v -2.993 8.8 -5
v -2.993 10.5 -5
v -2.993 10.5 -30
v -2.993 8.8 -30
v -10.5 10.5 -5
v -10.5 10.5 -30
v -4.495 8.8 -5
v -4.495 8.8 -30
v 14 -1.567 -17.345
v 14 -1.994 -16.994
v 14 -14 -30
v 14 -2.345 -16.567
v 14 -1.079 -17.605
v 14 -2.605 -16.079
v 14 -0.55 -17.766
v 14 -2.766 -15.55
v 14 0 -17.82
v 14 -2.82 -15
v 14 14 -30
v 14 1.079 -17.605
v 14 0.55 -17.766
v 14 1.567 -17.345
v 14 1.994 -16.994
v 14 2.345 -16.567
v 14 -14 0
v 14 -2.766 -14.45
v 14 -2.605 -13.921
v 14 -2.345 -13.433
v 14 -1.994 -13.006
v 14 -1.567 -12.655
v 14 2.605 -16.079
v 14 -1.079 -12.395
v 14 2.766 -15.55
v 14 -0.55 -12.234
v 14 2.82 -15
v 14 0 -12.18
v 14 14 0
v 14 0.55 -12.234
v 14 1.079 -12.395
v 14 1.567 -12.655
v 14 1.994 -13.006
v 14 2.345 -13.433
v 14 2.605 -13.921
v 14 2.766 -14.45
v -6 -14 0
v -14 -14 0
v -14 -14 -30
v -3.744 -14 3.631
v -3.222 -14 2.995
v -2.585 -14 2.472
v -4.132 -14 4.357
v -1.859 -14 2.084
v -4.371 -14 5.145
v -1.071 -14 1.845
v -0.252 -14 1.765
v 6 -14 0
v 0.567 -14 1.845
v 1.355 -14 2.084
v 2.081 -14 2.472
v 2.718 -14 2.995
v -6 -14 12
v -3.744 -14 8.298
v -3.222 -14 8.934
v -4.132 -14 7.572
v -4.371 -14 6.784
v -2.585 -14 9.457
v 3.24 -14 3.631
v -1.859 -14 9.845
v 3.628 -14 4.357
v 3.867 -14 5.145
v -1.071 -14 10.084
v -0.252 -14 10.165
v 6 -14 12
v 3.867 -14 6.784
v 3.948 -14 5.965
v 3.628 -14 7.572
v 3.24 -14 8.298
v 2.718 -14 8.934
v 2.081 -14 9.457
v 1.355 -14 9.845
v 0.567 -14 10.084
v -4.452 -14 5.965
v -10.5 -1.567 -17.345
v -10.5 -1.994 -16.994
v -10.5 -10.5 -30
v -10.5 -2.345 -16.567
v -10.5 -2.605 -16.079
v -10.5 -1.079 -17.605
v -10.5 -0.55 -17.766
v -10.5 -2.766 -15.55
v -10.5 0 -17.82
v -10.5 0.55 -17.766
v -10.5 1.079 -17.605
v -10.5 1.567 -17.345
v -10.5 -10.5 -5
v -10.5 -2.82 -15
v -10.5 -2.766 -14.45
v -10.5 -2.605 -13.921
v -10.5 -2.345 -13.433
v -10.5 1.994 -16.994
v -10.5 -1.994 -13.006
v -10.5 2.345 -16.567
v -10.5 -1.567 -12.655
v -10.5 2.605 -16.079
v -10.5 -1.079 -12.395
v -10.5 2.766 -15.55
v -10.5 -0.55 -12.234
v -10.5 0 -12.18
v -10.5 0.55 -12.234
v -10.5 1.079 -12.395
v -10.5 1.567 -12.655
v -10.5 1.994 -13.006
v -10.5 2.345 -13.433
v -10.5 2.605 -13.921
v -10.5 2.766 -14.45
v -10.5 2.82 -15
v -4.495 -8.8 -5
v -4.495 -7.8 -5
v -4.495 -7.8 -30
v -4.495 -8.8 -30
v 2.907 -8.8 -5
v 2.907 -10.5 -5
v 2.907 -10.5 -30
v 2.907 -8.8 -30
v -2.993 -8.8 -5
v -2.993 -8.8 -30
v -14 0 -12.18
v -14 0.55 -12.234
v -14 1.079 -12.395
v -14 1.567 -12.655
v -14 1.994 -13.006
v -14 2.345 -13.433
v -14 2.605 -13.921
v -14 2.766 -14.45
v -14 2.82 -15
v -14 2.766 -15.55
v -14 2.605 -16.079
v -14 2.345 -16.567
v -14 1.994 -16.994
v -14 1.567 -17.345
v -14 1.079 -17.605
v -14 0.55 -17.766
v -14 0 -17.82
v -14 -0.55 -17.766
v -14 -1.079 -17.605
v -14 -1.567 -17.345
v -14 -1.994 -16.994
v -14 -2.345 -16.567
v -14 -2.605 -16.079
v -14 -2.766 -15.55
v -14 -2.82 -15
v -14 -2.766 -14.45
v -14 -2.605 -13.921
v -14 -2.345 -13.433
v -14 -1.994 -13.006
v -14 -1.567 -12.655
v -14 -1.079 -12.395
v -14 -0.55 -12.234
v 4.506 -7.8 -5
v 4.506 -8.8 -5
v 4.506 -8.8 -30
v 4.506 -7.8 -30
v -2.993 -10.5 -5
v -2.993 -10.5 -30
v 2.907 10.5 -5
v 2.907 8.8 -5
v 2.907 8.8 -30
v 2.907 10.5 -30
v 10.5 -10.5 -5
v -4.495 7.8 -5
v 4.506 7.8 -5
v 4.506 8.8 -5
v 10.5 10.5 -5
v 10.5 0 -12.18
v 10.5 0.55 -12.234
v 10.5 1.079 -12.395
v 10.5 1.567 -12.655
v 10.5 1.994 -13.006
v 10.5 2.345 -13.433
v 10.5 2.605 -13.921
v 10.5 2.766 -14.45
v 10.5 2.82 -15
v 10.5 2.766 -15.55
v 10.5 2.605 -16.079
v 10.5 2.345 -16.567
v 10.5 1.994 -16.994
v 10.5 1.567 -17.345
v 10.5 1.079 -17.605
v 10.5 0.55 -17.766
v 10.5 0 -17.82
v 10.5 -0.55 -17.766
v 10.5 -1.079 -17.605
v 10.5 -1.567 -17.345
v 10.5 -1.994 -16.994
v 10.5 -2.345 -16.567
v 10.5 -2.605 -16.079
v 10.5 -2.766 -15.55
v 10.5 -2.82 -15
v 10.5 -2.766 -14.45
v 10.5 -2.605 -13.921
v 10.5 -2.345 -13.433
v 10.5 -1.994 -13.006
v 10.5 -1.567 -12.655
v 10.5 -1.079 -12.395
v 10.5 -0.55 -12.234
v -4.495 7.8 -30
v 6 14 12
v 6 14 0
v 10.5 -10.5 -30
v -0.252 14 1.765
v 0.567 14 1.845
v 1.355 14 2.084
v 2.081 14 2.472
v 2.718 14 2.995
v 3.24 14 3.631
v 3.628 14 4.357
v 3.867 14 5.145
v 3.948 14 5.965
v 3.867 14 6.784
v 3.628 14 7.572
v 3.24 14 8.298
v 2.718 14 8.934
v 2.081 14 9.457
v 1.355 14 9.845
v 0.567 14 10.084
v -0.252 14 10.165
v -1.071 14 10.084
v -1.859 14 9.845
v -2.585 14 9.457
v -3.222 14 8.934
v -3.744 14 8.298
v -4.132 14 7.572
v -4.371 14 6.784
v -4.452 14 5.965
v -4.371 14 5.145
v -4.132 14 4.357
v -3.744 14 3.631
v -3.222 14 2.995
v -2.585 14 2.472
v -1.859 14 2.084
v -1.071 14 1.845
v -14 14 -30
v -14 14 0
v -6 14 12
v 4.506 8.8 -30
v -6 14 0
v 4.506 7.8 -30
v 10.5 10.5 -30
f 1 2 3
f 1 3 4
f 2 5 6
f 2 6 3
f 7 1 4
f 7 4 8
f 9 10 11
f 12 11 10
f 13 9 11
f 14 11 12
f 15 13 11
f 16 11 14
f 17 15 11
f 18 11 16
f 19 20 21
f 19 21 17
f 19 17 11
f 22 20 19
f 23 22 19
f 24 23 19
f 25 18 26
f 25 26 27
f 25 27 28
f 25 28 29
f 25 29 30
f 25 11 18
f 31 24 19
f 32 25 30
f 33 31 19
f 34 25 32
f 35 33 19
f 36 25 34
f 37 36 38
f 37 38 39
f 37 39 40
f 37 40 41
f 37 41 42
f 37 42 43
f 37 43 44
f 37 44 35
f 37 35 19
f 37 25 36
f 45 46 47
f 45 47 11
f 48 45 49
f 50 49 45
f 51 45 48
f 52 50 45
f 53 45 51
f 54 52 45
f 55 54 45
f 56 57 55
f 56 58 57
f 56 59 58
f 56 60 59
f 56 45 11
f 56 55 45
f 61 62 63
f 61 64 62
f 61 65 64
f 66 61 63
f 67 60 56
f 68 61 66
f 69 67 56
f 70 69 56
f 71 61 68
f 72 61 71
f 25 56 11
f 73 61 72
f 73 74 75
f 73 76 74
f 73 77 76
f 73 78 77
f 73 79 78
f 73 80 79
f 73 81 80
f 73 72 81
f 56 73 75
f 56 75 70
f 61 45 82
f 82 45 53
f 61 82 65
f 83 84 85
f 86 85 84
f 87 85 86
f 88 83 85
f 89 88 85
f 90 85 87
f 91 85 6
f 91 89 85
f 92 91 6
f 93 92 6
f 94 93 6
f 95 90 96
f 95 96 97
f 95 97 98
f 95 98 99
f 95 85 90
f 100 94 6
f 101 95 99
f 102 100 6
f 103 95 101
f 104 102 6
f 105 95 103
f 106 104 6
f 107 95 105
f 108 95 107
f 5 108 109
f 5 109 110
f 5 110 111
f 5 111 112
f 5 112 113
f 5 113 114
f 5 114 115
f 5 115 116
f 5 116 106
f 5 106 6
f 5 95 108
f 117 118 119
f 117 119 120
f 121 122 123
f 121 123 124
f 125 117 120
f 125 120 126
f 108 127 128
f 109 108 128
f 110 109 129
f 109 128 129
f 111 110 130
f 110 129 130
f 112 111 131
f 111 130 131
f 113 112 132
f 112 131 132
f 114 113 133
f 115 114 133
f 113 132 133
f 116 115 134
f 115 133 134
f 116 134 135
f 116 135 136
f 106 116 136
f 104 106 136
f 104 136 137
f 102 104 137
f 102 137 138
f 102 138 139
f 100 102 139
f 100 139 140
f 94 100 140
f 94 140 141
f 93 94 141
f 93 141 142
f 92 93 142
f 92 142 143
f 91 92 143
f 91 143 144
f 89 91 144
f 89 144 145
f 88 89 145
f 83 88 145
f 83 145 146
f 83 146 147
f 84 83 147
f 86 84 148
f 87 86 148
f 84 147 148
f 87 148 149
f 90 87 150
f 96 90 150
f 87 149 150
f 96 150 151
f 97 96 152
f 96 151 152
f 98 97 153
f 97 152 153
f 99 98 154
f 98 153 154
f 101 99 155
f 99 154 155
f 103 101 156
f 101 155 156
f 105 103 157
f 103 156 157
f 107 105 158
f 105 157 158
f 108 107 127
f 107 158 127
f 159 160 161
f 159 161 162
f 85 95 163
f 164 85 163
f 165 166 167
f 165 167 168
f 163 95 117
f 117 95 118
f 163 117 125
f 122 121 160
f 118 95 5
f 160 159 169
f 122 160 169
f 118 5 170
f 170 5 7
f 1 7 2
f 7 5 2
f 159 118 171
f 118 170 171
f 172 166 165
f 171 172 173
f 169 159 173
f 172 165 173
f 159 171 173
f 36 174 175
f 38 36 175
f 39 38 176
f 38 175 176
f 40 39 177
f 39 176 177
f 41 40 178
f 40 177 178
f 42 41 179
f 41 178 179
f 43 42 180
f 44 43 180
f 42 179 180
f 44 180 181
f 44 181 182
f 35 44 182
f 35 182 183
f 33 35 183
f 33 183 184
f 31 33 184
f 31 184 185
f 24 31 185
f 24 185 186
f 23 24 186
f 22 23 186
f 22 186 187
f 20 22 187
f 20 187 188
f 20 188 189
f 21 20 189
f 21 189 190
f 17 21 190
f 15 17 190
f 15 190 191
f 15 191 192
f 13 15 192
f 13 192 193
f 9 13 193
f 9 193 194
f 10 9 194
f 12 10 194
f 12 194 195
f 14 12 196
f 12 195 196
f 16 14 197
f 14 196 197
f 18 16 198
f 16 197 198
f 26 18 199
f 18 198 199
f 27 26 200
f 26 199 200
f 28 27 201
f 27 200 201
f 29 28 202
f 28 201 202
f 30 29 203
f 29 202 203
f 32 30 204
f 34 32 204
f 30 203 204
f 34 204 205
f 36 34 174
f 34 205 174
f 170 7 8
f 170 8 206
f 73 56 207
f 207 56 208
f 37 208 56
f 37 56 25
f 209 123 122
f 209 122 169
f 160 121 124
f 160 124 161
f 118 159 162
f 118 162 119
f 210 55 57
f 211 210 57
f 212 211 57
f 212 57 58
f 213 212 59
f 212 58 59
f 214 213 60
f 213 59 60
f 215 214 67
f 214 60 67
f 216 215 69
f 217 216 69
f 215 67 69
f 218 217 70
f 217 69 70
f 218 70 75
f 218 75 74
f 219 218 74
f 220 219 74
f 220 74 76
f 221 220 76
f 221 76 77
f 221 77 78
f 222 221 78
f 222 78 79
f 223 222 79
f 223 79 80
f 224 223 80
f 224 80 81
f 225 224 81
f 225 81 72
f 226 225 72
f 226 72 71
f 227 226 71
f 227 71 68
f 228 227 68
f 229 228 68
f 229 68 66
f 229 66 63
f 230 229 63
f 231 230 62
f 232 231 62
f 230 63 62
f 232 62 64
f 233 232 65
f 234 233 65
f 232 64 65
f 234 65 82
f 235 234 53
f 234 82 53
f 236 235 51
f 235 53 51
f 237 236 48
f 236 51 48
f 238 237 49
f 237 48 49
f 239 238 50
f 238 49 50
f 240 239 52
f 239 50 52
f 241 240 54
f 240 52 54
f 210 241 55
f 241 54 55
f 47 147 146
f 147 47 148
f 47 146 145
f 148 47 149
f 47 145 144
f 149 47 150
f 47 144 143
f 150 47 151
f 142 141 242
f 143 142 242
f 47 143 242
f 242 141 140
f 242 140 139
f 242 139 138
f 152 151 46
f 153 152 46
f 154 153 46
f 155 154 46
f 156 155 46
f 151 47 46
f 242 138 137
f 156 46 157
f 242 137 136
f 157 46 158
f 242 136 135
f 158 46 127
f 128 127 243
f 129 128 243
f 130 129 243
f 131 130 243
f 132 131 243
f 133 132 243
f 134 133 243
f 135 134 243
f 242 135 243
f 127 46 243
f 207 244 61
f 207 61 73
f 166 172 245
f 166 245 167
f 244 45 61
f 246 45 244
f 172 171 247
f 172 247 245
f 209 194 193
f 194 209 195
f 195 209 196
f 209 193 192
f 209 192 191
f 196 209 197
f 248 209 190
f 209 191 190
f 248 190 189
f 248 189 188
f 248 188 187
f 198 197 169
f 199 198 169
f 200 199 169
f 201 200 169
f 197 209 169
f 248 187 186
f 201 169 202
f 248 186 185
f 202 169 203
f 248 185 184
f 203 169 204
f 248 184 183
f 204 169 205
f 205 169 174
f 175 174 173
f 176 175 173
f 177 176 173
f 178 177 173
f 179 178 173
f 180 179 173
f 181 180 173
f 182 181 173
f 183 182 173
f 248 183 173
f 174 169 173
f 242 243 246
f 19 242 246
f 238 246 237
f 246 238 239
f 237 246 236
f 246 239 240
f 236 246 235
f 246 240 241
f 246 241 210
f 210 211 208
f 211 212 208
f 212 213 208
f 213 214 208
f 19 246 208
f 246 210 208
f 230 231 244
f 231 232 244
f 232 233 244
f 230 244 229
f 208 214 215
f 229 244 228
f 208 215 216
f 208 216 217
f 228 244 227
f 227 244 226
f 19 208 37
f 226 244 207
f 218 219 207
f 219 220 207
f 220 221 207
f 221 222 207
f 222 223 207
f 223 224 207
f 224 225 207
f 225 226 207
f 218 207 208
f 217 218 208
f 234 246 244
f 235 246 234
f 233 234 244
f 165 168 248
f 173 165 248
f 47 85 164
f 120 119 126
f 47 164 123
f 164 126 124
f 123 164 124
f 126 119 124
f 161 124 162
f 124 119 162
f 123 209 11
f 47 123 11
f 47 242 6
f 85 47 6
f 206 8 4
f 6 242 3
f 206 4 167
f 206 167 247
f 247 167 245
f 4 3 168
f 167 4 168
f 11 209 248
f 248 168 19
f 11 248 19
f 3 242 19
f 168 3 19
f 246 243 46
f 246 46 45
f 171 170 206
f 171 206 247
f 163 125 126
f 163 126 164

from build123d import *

# Parameters (mm, degrees)
EXTRUDE_2_DEPTH     = 30
EXTRUDE_2_2_DEPTH   = 30
EXTRUDE_3_DEPTH     = 5
SKETCH_2_5_W        = 28
SKETCH_2_5_H        = 28
EXTRUDE_4_DEPTH     = 30
SKETCH_5_R          = 2.82
CUT_EXTRUDE_1_DEPTH = 44.358966777
SKETCH_6_W          = 12
SKETCH_6_H          = 28
EXTRUDE_7_DEPTH     = 12
SKETCH_9_R          = 4.2
CUT_EXTRUDE_3_DEPTH = 44.358966777


with BuildPart() as part:
    # Эскиз2 → Бобышка-Вытянуть2 (new body)
    with BuildSketch(Plane.XY):
        Polygon((2.906720935, 8.8), (2.906720935, 10.5), (-2.993279065, 10.5), (-2.993279065, 8.8), (-4.495247842, 8.8), (-4.495247842, 7.799871607), (4.505554414, 7.799871607), (4.505554414, 8.8), align=None)
    extrude(amount=-EXTRUDE_2_DEPTH)



with BuildPart() as body_2:
    # Эскиз2 → Extrude 2 2 (new body)
    with BuildSketch(Plane.XY):
        Polygon((-2.993279065, -10.5), (2.906720935, -10.5), (2.906720935, -8.8), (4.505554414, -8.8), (4.505554414, -7.799871607), (-4.495247842, -7.799871607), (-4.495247842, -8.8), (-2.993279065, -8.8), align=None)
    extrude(amount=-EXTRUDE_2_2_DEPTH)


with BuildPart() as part_1:
    add(part.part)

    add(body_2.part)  # Бобышка-Вытянуть3 merges body 2
    # Эскиз2<4> → Бобышка-Вытянуть3 (add)
    with BuildSketch(Plane.XY):
        Polygon((10.5, -10.5), (10.5, 10.5), (2.906720935, 10.5), (2.906720935, 8.8), (4.505554414, 8.8), (4.505554414, 7.799871607), (-4.495247842, 7.799871607), (-4.495247842, 8.8), (-2.993279065, 8.8), (-2.993279065, 10.5), (-10.5, 10.5), (-10.5, -10.5), (-2.993279065, -10.5), (-2.993279065, -8.8), (-4.495247842, -8.8), (-4.495247842, -7.799871607), (4.505554414, -7.799871607), (4.505554414, -8.8), (2.906720935, -8.8), (2.906720935, -10.5), align=None)
    extrude(amount=-EXTRUDE_3_DEPTH)

    # Эскиз2<5> → Бобышка-Вытянуть4 (add)
    with BuildSketch(Plane.XY):
        Rectangle(SKETCH_2_5_W, SKETCH_2_5_H)
        Polygon((10.5, 10.5), (10.5, 0), (10.5, -10.5), (2.906720935, -10.5), (-2.993279065, -10.5), (-10.5, -10.5), (-10.5, 0), (-10.5, 10.5), (-2.993279065, 10.5), (2.906720935, 10.5), align=None, mode=Mode.SUBTRACT)
    extrude(amount=-EXTRUDE_4_DEPTH)

    # Эскиз5 → Вырез-Вытянуть1 (cut, through all)
    with BuildSketch(Plane.ZY.offset(14)):
        with Locations((-15, 0)):
            Circle(SKETCH_5_R)
    extrude(amount=-CUT_EXTRUDE_1_DEPTH, mode=Mode.SUBTRACT)

    # Эскиз6 → Бобышка-Вытянуть7 (add)
    with BuildSketch(Plane.XY):
        Rectangle(SKETCH_6_W, SKETCH_6_H)
    extrude(amount=EXTRUDE_7_DEPTH)

    # Эскиз9 → Вырез-Вытянуть3 (cut, through all)
    with BuildSketch(Plane.XZ.offset(14)):
        with Locations((-0.251999231, 5.964564793)):
            Circle(SKETCH_9_R)
    extrude(amount=-CUT_EXTRUDE_3_DEPTH, mode=Mode.SUBTRACT)


solid = part_1.part
